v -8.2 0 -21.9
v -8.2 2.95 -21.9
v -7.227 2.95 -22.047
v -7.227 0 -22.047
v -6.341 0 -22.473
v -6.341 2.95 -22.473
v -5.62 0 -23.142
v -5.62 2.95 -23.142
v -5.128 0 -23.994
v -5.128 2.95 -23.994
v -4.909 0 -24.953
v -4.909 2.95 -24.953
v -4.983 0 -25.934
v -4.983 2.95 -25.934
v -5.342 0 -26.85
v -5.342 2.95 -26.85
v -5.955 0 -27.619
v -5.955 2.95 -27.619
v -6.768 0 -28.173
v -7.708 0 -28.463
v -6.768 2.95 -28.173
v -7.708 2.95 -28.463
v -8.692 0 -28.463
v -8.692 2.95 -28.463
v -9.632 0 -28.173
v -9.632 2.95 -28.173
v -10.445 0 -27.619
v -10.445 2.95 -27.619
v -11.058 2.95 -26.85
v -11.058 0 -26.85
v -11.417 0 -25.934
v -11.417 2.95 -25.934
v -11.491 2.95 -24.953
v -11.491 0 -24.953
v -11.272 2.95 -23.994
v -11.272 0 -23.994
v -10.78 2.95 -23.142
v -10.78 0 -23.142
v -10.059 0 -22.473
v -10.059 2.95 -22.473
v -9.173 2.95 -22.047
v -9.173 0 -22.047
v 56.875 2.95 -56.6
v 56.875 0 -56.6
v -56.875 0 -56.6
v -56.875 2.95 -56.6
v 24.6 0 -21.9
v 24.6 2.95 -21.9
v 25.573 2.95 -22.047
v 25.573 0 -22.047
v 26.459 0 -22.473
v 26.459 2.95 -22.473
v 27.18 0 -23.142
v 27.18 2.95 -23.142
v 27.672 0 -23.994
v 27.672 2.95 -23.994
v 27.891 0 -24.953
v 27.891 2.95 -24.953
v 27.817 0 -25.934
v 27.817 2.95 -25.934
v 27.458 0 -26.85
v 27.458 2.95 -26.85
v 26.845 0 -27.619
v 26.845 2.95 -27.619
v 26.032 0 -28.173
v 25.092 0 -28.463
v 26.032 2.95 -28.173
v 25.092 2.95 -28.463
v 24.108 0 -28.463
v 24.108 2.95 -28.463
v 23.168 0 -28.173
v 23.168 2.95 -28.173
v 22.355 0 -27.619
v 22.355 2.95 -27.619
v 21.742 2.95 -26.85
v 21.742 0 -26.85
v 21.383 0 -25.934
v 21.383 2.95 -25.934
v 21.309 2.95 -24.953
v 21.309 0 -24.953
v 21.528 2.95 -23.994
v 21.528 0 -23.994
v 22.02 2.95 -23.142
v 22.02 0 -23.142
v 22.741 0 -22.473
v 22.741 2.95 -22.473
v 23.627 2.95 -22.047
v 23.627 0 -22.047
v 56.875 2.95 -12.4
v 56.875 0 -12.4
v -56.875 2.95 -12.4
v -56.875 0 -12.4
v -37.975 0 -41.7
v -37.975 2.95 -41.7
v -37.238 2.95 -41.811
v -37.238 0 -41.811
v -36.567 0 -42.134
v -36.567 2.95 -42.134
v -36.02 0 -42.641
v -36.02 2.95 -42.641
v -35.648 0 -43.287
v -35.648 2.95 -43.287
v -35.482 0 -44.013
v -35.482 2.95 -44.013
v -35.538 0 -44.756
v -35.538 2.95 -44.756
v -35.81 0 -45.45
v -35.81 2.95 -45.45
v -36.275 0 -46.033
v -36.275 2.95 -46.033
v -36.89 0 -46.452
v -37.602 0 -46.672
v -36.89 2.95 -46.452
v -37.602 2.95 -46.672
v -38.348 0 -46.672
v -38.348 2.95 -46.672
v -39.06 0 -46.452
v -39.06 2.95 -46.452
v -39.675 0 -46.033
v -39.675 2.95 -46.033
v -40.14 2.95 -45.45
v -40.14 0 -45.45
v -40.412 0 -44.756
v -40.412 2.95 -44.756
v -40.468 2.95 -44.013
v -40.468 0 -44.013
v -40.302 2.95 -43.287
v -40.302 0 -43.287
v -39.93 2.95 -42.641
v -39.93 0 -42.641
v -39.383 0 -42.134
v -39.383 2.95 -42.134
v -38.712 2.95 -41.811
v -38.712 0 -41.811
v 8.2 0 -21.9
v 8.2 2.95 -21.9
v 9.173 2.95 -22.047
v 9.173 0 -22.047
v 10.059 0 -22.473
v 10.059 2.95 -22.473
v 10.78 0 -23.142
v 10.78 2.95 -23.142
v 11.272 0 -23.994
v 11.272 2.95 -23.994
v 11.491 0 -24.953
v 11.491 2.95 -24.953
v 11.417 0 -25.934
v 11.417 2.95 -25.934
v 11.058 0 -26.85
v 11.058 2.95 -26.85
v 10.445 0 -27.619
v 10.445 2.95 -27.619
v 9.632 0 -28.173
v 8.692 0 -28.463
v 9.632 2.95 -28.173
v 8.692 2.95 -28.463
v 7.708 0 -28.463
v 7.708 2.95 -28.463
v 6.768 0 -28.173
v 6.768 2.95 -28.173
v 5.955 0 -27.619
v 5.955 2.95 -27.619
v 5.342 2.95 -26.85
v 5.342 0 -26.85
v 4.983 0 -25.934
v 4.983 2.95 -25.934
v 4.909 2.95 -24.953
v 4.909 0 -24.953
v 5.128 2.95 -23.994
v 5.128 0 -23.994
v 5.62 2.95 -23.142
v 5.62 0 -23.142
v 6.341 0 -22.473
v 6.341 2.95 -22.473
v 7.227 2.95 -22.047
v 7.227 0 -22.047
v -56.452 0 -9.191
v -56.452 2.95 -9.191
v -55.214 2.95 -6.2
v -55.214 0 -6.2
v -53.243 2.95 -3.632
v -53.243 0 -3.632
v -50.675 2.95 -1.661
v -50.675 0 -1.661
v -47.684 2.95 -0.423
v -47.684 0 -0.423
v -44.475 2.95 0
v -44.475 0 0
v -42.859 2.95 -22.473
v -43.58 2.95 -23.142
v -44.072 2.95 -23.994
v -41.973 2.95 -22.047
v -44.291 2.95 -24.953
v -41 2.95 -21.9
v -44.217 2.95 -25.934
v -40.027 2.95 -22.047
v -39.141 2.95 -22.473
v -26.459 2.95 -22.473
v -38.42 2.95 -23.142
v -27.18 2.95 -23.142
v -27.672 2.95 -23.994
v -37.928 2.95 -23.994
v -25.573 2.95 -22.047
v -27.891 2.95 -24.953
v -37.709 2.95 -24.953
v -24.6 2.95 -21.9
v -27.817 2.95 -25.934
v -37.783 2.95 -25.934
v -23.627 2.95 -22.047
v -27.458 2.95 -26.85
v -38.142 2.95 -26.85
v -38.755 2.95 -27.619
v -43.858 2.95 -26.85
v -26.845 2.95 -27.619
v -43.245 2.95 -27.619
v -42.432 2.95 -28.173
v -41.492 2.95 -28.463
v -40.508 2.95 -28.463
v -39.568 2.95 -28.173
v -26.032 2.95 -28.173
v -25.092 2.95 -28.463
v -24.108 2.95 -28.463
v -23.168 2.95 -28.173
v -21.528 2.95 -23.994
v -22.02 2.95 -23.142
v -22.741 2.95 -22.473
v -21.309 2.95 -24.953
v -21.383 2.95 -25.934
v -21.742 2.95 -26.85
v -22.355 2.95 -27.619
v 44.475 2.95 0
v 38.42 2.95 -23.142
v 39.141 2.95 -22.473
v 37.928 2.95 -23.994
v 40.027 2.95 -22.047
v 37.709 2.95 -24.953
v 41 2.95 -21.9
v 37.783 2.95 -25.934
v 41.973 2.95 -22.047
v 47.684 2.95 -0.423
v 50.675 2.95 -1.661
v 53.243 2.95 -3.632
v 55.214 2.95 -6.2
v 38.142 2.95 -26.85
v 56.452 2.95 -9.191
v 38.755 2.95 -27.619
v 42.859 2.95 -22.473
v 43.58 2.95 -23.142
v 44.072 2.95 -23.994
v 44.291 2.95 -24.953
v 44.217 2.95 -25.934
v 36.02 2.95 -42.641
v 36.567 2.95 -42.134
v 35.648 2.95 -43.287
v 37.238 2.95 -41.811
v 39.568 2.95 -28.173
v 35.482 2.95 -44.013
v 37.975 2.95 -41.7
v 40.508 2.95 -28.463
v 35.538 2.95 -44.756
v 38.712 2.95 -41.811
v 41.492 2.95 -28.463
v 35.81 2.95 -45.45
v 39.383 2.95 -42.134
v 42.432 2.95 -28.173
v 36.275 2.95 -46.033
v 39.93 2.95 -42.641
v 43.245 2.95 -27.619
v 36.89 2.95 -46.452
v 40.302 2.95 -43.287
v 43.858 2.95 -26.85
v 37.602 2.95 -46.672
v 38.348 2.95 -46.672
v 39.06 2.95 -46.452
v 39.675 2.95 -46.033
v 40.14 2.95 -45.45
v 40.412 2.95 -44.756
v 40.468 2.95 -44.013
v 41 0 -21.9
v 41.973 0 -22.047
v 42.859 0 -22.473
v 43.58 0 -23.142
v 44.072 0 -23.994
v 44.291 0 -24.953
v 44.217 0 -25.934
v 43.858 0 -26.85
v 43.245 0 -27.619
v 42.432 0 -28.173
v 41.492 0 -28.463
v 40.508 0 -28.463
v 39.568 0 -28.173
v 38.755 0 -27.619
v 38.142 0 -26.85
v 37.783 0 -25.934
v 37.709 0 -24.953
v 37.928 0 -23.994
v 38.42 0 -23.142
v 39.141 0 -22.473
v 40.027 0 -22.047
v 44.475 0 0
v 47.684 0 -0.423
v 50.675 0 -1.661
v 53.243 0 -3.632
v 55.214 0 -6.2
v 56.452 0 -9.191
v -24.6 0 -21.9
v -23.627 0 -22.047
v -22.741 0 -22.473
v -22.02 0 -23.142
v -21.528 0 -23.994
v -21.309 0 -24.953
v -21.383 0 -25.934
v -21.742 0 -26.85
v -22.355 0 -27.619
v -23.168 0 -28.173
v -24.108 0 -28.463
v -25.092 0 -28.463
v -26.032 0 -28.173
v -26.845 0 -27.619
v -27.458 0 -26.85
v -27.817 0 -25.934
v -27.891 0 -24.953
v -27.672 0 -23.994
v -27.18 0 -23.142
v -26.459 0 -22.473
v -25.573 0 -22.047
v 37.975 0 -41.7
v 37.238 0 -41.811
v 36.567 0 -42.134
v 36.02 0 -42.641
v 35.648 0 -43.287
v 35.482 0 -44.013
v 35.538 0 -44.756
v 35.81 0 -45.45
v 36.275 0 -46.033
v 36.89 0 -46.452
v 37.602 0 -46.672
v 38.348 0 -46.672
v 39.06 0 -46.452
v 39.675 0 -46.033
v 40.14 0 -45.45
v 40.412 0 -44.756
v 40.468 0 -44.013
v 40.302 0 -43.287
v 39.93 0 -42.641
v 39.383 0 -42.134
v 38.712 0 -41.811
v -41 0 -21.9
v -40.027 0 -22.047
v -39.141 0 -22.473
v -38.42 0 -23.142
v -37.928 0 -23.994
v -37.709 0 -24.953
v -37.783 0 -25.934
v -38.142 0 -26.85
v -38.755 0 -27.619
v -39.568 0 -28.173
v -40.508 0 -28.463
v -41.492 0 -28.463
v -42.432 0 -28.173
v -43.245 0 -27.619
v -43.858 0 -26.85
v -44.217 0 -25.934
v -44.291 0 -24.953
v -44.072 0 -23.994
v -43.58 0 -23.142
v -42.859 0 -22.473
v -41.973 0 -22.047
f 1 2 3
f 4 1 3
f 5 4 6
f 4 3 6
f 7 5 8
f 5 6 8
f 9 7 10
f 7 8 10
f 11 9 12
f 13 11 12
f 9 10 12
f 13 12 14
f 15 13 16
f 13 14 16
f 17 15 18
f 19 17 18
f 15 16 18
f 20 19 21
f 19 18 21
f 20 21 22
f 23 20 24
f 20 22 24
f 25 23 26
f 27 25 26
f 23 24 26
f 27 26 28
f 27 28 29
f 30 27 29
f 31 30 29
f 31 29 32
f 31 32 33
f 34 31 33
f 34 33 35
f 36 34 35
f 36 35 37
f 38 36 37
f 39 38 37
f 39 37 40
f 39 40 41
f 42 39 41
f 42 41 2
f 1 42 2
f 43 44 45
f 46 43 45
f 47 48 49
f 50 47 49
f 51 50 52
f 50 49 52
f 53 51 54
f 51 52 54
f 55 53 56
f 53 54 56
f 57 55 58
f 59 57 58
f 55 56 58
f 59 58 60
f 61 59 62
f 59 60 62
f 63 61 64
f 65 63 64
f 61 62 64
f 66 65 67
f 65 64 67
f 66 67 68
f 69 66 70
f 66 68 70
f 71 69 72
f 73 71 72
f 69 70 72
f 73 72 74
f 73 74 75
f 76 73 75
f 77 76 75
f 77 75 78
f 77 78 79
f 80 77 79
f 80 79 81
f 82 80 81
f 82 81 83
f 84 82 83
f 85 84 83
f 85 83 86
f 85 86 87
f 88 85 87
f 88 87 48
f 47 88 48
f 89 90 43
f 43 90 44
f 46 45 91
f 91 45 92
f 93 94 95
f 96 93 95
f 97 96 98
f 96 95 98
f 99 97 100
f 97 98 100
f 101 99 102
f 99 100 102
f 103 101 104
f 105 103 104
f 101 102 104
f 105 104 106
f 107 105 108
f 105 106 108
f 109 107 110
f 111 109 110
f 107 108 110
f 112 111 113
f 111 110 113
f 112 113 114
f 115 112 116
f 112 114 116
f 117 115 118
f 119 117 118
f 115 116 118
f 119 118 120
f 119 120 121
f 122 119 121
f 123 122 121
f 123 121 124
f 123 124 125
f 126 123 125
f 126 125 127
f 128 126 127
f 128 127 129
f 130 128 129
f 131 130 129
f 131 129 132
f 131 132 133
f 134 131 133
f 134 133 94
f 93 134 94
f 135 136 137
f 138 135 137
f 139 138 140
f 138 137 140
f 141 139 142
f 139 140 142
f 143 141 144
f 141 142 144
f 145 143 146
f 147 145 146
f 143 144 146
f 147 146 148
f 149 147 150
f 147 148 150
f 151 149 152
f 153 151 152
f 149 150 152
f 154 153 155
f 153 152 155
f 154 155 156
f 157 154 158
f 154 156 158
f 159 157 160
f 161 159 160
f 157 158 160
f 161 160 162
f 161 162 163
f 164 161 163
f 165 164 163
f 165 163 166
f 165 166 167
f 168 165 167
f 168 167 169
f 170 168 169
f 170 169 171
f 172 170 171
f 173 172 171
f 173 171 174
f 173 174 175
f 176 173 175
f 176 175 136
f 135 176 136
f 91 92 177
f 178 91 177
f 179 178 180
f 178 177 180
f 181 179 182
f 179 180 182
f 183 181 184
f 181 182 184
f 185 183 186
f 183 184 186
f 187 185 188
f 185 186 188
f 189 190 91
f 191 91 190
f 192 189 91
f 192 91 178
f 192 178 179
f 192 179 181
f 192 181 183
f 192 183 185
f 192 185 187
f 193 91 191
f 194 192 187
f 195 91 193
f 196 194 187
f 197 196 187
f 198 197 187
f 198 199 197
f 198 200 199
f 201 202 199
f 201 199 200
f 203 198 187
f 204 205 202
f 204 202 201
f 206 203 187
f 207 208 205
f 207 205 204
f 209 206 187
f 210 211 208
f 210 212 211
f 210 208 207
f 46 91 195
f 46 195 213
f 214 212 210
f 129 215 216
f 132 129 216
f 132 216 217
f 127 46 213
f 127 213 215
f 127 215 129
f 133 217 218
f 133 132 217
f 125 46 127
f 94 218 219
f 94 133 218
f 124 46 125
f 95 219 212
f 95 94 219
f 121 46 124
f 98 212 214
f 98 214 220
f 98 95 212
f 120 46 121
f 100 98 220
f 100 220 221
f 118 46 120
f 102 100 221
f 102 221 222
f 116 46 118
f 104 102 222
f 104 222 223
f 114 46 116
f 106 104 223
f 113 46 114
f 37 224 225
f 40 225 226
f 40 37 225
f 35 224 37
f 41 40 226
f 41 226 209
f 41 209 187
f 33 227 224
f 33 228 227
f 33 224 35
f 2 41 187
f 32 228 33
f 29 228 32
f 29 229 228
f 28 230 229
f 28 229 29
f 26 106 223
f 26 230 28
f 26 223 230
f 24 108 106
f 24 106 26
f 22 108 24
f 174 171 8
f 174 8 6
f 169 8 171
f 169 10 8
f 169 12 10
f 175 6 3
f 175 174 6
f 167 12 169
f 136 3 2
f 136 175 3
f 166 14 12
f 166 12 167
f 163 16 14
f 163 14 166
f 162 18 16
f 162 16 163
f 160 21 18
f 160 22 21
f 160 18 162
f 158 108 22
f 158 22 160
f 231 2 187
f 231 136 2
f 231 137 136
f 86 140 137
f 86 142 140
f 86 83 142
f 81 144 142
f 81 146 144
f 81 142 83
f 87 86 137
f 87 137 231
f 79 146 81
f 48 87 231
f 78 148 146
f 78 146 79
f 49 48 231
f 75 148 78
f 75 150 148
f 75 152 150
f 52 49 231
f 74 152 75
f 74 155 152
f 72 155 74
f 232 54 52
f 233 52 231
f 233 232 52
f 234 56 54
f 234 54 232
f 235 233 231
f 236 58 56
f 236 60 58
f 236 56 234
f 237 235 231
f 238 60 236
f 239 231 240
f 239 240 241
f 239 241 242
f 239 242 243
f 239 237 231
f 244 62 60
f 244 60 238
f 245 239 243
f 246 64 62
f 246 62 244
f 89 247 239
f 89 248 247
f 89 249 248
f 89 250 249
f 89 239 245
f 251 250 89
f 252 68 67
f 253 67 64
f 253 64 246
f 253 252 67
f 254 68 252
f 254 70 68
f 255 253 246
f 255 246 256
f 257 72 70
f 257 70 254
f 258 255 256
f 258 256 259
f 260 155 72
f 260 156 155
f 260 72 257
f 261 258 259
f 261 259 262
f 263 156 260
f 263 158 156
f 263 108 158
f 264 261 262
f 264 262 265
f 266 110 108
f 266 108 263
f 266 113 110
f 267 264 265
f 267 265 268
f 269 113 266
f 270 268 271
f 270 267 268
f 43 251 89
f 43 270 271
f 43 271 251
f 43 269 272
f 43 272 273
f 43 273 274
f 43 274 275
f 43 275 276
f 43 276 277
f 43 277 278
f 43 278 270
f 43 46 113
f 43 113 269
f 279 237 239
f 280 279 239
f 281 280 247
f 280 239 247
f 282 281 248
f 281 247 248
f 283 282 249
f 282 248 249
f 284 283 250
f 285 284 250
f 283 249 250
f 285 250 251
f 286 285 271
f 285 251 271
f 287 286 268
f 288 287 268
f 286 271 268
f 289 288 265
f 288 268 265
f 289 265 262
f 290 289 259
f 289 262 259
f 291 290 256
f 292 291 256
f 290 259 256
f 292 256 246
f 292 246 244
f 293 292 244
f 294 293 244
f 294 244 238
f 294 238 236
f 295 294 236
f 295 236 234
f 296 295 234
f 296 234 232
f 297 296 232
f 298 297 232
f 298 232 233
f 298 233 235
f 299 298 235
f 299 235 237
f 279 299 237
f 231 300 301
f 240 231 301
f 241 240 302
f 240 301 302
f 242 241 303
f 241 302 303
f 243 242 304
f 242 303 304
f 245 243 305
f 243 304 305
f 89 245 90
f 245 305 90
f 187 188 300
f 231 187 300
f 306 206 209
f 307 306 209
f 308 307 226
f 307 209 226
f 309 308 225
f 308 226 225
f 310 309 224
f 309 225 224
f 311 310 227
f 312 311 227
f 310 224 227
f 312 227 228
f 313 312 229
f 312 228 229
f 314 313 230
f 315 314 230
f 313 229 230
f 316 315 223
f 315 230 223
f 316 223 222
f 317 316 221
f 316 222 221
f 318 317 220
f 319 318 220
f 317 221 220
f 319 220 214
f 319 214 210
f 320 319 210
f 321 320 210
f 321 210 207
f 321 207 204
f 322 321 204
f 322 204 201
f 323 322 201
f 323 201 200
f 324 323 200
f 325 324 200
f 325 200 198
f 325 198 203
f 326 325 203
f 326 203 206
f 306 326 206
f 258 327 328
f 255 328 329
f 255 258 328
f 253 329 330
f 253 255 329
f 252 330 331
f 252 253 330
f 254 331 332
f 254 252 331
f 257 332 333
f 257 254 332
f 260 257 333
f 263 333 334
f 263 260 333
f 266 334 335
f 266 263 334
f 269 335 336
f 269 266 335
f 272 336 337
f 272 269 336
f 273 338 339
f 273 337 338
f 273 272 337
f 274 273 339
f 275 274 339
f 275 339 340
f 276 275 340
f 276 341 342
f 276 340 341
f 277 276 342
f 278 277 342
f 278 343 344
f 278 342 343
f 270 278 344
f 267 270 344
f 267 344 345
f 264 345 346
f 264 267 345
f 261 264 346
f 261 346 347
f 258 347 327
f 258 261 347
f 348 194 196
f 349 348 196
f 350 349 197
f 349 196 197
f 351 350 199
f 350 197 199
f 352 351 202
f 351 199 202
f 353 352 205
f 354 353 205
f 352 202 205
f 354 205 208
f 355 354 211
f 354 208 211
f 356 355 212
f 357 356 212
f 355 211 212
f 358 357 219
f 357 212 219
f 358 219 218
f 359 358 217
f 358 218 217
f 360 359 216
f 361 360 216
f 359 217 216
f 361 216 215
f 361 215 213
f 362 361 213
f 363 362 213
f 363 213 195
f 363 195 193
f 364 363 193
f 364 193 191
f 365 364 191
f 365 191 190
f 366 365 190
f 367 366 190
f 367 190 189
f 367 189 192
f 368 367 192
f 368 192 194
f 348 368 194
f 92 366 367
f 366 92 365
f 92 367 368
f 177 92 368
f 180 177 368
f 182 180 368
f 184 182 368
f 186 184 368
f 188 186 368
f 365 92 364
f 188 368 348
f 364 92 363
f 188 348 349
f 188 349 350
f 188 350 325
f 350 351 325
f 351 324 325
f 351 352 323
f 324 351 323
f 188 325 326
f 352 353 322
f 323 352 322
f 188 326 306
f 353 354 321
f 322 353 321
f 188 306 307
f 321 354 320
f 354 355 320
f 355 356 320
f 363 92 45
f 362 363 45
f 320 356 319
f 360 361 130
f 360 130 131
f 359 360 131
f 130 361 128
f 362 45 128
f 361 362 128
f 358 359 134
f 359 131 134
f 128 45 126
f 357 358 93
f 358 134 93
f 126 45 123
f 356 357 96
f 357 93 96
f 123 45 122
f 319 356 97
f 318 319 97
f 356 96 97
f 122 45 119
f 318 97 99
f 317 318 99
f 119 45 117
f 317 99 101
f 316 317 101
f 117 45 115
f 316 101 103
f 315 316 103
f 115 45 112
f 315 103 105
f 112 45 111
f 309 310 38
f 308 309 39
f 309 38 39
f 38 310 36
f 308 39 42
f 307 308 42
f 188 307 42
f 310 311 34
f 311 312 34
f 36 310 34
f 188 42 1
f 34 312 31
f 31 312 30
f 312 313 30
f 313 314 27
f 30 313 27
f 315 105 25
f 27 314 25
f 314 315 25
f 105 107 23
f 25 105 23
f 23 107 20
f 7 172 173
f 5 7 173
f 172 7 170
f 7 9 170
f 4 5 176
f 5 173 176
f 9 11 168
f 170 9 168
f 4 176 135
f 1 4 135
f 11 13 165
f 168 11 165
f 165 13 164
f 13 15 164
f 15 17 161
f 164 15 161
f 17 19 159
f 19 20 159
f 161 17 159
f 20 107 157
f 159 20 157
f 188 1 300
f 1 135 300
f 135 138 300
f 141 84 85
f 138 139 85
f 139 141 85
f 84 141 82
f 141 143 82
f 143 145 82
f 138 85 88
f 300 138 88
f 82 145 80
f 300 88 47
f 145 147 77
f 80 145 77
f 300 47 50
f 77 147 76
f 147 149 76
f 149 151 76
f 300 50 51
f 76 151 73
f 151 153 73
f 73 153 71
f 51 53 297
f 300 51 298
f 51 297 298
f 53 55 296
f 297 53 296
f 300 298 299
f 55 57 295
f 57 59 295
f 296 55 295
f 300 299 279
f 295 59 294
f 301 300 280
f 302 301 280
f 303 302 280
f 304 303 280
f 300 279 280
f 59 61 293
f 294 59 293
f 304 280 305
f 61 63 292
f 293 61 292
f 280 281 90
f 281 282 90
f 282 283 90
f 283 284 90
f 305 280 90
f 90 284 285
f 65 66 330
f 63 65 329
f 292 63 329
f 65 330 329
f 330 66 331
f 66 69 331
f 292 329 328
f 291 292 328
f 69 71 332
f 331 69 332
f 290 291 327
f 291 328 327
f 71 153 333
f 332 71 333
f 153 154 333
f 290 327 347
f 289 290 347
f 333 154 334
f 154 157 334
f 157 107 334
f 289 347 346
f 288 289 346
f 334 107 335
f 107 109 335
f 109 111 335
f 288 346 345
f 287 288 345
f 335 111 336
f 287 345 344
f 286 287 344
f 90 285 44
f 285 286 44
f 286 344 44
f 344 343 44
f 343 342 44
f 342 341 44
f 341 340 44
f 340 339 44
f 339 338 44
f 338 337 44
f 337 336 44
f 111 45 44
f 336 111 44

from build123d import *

# Parameters (mm, degrees)
BOSS_EXTRUDE1_DEPTH = 2.95
SKETCH5_R           = 3.3
HOLE1_DEPTH         = 81.293387804
SKETCH7_R           = 2.5
CUT_EXTRUDE2_DEPTH  = 81.293387804


with BuildPart() as part:
    # Sketch1 → Boss-Extrude1 (new body)
    with BuildSketch(Plane(origin=(0, 0, 0), x_dir=(1, 0, 0), z_dir=(0, 1, 0))):
        with BuildLine():
            Line((-44.475, 0), (44.475, 0))
            ThreePointArc((44.475, 0), (53.243124087, 3.631875913), (56.875, 12.4))
            Line((56.875, 12.4), (56.875, 56.6))
            Line((56.875, 56.6), (-56.875, 56.6))
            Line((-56.875, 56.6), (-56.875, 12.4))
            ThreePointArc((-56.875, 12.4), (-53.243124087, 3.631875913), (-44.475, 0))
        make_face()
    extrude(amount=BOSS_EXTRUDE1_DEPTH)

    # Sketch5 → Hole1 (cut, through all)
    with BuildSketch(Plane(origin=(0, 2.95, 0), x_dir=(1, 0, 0), z_dir=(0, 1, 0))):
        with Locations(Location((-41, 25.2, 0), (0, 0, 270))):
            Circle(SKETCH5_R)
        with Locations(Location((-24.6, 25.2, 0), (0, 0, 270))):
            Circle(SKETCH5_R)
        with Locations(Location((-8.2, 25.2, 0), (0, 0, 270))):
            Circle(SKETCH5_R)
        with Locations(Location((8.2, 25.2, 0), (0, 0, 270))):
            Circle(SKETCH5_R)
        with Locations(Location((24.6, 25.2, 0), (0, 0, 270))):
            Circle(SKETCH5_R)
        with Locations(Location((41, 25.2, 0), (0, 0, 270))):
            Circle(SKETCH5_R)
    extrude(amount=-HOLE1_DEPTH, mode=Mode.SUBTRACT)

    # Sketch7 → Cut-Extrude2 (cut, through all)
    with BuildSketch(Plane(origin=(0, 2.95, 0), x_dir=(1, 0, 0), z_dir=(0, 1, 0))):
        with Locations(Location((-37.975, 44.2, 0), (0, 0, 270))):
            Circle(SKETCH7_R)
    cut_extrude2 = extrude(amount=-CUT_EXTRUDE2_DEPTH, mode=Mode.SUBTRACT)

    # Mirror1: Cut-Extrude2 across plane
    add(cut_extrude2.mirror(Plane(origin=(0, 0, 0), x_dir=(0, 0, 1), z_dir=(1, 0, 0))), mode=Mode.SUBTRACT)


solid = part.part
